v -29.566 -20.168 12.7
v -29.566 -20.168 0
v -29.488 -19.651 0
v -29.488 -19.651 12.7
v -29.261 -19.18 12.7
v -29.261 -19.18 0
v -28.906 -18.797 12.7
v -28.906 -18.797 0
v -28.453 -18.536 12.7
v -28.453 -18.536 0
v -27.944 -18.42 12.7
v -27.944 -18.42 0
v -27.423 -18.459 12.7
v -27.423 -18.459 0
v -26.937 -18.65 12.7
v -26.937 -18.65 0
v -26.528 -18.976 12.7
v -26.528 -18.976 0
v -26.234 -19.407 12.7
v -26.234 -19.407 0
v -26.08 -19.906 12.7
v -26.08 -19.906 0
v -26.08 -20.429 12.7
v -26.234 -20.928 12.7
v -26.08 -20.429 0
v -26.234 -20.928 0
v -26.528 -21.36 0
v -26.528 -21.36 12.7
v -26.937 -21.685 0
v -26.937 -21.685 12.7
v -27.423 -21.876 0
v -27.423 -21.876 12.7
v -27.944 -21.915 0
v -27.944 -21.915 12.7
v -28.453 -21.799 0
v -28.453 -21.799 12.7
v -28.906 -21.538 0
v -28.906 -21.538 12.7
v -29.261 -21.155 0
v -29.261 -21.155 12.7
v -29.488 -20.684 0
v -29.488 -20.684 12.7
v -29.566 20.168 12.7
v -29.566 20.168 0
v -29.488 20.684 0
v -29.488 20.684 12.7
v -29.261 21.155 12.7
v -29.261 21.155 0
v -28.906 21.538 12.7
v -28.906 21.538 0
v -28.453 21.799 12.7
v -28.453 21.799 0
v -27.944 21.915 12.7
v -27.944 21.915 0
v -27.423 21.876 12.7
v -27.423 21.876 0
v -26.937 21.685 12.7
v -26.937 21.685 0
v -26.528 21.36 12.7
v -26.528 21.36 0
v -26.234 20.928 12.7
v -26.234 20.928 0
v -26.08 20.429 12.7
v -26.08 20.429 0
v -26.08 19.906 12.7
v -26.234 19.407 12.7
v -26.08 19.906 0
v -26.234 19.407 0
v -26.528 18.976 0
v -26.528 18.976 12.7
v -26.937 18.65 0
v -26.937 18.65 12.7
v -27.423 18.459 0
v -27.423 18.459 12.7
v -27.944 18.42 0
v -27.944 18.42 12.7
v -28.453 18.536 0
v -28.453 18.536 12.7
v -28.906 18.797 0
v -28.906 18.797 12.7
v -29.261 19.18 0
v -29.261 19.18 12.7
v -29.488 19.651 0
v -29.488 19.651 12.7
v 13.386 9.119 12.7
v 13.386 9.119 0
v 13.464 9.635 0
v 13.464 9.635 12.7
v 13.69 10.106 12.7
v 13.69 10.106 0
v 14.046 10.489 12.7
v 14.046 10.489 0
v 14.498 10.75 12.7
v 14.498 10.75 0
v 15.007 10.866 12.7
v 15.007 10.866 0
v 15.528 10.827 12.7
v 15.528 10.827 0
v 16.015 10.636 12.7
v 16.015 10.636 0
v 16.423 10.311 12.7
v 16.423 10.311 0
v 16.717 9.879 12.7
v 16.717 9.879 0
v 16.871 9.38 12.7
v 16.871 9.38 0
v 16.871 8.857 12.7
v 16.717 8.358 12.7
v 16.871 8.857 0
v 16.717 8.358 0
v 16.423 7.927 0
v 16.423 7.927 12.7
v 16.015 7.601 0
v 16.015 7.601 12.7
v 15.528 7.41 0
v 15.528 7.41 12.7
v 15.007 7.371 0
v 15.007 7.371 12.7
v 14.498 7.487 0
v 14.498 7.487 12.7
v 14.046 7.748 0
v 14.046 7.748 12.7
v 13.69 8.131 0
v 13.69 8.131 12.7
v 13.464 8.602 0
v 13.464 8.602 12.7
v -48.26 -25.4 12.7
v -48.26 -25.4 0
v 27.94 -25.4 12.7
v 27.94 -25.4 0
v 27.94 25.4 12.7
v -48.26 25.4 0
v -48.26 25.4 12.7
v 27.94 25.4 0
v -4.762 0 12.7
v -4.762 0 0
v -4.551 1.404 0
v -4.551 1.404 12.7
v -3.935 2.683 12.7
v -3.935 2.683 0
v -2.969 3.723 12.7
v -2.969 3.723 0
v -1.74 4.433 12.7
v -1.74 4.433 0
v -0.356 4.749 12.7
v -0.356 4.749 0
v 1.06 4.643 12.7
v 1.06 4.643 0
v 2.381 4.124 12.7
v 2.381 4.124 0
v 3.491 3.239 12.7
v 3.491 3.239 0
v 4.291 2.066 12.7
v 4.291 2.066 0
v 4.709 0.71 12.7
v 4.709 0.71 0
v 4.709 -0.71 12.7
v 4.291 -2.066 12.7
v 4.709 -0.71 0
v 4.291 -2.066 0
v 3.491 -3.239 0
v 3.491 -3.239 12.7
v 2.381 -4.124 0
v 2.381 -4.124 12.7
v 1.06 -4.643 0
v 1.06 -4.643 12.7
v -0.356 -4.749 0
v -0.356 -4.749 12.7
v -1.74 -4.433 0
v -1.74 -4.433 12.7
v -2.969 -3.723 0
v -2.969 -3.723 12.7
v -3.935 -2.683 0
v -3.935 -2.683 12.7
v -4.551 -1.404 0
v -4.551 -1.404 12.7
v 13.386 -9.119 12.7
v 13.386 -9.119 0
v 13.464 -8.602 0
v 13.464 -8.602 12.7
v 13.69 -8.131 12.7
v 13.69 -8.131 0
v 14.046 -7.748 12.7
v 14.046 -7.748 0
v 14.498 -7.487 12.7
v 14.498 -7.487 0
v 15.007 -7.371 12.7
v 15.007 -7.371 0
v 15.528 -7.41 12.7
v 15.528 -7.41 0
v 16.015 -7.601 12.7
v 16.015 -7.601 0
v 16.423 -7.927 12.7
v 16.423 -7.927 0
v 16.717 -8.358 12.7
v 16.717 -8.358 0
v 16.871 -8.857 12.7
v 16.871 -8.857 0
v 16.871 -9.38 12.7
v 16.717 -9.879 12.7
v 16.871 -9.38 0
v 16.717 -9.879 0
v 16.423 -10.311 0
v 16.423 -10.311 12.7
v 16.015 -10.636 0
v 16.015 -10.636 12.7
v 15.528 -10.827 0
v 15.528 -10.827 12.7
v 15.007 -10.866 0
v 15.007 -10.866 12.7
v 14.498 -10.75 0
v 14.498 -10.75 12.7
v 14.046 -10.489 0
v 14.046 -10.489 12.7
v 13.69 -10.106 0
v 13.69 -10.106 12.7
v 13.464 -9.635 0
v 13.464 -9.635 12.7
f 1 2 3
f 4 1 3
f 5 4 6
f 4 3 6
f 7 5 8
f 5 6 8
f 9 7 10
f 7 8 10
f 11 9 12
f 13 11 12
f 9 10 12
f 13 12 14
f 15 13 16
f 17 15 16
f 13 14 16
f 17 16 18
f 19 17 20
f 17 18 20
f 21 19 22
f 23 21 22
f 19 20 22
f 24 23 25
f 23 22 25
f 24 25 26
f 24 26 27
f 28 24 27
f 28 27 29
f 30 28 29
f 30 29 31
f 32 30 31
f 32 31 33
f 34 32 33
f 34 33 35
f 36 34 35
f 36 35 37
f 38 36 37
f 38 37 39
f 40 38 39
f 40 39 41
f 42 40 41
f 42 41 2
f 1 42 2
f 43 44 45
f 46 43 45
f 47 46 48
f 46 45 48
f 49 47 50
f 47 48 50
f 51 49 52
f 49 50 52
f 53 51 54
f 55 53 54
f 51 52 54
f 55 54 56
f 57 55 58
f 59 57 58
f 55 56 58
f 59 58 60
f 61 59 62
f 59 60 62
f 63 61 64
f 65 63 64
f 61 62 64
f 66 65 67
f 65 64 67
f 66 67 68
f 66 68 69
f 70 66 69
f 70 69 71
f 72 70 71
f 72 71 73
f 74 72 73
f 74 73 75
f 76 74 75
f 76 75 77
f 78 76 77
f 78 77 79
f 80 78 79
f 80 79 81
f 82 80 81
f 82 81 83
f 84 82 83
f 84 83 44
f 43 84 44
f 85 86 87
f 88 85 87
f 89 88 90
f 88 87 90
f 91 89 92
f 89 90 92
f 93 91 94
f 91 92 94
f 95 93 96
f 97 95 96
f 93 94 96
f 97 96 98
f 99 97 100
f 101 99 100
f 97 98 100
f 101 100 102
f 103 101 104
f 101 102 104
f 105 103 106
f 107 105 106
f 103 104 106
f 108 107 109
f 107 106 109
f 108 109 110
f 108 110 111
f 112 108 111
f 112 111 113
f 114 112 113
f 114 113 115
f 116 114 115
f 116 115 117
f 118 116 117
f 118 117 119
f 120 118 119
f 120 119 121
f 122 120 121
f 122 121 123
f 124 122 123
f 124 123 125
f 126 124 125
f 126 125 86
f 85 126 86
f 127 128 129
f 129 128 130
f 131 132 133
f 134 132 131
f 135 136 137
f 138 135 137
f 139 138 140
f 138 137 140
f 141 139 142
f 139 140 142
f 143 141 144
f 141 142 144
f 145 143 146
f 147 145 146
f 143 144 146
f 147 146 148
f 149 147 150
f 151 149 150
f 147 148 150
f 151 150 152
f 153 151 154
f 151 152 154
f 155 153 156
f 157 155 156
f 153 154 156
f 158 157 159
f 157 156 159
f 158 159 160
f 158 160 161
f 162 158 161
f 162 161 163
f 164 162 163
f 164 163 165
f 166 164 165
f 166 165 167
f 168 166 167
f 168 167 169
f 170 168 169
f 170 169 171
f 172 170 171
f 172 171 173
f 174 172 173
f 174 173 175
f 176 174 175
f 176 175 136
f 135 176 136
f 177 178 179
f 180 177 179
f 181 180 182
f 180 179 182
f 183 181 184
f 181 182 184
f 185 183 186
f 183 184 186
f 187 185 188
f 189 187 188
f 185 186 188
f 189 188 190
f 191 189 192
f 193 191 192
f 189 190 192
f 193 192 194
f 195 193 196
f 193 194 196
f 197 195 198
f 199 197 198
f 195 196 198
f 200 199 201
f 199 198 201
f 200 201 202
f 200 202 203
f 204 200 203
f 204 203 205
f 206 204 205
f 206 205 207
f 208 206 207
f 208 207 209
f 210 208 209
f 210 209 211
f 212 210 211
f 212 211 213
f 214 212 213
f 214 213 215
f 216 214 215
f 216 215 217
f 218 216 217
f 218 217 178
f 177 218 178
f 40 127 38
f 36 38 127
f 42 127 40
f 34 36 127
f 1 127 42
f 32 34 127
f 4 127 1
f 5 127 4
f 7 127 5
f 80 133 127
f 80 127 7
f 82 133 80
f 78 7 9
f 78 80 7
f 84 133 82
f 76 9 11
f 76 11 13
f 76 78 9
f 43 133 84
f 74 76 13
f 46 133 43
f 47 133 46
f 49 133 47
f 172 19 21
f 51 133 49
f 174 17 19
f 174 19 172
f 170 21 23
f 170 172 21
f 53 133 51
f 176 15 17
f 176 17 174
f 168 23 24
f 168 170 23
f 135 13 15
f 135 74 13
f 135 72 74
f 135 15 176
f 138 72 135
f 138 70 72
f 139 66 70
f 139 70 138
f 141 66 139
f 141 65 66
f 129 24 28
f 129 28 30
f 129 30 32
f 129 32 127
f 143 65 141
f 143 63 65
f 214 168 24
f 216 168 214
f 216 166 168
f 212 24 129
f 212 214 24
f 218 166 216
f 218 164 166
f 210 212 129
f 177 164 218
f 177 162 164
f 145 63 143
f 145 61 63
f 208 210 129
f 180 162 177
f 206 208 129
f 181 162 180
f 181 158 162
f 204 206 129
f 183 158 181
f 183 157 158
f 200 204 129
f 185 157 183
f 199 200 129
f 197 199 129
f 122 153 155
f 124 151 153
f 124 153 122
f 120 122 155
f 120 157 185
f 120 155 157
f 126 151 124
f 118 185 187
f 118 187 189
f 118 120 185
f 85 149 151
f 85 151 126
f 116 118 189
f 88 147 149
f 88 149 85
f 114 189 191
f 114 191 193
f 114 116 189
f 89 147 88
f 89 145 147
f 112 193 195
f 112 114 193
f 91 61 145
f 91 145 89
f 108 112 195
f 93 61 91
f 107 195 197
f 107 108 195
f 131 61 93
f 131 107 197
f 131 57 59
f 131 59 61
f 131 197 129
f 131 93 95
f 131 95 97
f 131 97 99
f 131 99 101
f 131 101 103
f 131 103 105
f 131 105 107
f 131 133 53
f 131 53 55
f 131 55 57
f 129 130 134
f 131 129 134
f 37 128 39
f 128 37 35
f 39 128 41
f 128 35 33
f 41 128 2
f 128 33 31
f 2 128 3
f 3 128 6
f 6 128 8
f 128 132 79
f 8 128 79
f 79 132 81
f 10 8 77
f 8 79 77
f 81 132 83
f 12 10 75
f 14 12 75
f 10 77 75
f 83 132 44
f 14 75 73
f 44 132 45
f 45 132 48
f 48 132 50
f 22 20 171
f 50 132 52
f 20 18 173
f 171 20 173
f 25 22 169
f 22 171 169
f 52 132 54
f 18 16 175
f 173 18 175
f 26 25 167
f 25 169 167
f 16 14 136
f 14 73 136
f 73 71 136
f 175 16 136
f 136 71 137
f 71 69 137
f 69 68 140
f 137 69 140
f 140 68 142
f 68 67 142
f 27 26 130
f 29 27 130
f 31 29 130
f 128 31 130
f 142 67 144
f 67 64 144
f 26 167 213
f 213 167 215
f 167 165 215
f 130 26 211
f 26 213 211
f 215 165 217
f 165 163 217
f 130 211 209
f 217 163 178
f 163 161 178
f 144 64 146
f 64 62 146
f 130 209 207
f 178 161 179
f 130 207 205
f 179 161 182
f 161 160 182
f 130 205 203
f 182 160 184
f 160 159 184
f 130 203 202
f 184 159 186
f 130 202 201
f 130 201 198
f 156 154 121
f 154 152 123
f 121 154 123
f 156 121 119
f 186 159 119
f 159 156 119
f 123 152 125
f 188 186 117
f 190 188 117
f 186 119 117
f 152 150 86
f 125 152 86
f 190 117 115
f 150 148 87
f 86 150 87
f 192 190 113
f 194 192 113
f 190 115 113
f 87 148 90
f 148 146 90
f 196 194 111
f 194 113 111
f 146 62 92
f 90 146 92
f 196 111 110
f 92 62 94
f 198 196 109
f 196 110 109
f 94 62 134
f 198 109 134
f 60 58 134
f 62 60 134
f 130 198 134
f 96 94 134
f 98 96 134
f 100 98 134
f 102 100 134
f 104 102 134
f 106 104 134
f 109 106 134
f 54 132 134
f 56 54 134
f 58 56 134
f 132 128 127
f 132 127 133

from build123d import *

# Parameters (mm, degrees)
F0_W     = 76.2
F0_H     = 50.8
F1_DEPTH = 12.7
F3_D     = 9.525
F5_D     = 3.5052


with BuildPart() as f1:
    # F0 (on Top) → F1 (new body)
    with BuildSketch(Plane.XY):
        with Locations((-10.16, 0)):
            Rectangle(F0_W, F0_H)
    extrude(amount=F1_DEPTH)

    # F3 (through all)
    with Locations(Plane.XY.offset(12.7)):
        with Locations((0, 0)):
            Hole(F3_D / 2)

    # F5 (through all)
    with Locations(Plane.XY.offset(12.7)):
        with Locations((15.1384, 9.1186), (15.1384, -9.1186), (-27.813, 20.1676), (-27.813, -20.1676)):
            Hole(F5_D / 2)


solid = f1.part
